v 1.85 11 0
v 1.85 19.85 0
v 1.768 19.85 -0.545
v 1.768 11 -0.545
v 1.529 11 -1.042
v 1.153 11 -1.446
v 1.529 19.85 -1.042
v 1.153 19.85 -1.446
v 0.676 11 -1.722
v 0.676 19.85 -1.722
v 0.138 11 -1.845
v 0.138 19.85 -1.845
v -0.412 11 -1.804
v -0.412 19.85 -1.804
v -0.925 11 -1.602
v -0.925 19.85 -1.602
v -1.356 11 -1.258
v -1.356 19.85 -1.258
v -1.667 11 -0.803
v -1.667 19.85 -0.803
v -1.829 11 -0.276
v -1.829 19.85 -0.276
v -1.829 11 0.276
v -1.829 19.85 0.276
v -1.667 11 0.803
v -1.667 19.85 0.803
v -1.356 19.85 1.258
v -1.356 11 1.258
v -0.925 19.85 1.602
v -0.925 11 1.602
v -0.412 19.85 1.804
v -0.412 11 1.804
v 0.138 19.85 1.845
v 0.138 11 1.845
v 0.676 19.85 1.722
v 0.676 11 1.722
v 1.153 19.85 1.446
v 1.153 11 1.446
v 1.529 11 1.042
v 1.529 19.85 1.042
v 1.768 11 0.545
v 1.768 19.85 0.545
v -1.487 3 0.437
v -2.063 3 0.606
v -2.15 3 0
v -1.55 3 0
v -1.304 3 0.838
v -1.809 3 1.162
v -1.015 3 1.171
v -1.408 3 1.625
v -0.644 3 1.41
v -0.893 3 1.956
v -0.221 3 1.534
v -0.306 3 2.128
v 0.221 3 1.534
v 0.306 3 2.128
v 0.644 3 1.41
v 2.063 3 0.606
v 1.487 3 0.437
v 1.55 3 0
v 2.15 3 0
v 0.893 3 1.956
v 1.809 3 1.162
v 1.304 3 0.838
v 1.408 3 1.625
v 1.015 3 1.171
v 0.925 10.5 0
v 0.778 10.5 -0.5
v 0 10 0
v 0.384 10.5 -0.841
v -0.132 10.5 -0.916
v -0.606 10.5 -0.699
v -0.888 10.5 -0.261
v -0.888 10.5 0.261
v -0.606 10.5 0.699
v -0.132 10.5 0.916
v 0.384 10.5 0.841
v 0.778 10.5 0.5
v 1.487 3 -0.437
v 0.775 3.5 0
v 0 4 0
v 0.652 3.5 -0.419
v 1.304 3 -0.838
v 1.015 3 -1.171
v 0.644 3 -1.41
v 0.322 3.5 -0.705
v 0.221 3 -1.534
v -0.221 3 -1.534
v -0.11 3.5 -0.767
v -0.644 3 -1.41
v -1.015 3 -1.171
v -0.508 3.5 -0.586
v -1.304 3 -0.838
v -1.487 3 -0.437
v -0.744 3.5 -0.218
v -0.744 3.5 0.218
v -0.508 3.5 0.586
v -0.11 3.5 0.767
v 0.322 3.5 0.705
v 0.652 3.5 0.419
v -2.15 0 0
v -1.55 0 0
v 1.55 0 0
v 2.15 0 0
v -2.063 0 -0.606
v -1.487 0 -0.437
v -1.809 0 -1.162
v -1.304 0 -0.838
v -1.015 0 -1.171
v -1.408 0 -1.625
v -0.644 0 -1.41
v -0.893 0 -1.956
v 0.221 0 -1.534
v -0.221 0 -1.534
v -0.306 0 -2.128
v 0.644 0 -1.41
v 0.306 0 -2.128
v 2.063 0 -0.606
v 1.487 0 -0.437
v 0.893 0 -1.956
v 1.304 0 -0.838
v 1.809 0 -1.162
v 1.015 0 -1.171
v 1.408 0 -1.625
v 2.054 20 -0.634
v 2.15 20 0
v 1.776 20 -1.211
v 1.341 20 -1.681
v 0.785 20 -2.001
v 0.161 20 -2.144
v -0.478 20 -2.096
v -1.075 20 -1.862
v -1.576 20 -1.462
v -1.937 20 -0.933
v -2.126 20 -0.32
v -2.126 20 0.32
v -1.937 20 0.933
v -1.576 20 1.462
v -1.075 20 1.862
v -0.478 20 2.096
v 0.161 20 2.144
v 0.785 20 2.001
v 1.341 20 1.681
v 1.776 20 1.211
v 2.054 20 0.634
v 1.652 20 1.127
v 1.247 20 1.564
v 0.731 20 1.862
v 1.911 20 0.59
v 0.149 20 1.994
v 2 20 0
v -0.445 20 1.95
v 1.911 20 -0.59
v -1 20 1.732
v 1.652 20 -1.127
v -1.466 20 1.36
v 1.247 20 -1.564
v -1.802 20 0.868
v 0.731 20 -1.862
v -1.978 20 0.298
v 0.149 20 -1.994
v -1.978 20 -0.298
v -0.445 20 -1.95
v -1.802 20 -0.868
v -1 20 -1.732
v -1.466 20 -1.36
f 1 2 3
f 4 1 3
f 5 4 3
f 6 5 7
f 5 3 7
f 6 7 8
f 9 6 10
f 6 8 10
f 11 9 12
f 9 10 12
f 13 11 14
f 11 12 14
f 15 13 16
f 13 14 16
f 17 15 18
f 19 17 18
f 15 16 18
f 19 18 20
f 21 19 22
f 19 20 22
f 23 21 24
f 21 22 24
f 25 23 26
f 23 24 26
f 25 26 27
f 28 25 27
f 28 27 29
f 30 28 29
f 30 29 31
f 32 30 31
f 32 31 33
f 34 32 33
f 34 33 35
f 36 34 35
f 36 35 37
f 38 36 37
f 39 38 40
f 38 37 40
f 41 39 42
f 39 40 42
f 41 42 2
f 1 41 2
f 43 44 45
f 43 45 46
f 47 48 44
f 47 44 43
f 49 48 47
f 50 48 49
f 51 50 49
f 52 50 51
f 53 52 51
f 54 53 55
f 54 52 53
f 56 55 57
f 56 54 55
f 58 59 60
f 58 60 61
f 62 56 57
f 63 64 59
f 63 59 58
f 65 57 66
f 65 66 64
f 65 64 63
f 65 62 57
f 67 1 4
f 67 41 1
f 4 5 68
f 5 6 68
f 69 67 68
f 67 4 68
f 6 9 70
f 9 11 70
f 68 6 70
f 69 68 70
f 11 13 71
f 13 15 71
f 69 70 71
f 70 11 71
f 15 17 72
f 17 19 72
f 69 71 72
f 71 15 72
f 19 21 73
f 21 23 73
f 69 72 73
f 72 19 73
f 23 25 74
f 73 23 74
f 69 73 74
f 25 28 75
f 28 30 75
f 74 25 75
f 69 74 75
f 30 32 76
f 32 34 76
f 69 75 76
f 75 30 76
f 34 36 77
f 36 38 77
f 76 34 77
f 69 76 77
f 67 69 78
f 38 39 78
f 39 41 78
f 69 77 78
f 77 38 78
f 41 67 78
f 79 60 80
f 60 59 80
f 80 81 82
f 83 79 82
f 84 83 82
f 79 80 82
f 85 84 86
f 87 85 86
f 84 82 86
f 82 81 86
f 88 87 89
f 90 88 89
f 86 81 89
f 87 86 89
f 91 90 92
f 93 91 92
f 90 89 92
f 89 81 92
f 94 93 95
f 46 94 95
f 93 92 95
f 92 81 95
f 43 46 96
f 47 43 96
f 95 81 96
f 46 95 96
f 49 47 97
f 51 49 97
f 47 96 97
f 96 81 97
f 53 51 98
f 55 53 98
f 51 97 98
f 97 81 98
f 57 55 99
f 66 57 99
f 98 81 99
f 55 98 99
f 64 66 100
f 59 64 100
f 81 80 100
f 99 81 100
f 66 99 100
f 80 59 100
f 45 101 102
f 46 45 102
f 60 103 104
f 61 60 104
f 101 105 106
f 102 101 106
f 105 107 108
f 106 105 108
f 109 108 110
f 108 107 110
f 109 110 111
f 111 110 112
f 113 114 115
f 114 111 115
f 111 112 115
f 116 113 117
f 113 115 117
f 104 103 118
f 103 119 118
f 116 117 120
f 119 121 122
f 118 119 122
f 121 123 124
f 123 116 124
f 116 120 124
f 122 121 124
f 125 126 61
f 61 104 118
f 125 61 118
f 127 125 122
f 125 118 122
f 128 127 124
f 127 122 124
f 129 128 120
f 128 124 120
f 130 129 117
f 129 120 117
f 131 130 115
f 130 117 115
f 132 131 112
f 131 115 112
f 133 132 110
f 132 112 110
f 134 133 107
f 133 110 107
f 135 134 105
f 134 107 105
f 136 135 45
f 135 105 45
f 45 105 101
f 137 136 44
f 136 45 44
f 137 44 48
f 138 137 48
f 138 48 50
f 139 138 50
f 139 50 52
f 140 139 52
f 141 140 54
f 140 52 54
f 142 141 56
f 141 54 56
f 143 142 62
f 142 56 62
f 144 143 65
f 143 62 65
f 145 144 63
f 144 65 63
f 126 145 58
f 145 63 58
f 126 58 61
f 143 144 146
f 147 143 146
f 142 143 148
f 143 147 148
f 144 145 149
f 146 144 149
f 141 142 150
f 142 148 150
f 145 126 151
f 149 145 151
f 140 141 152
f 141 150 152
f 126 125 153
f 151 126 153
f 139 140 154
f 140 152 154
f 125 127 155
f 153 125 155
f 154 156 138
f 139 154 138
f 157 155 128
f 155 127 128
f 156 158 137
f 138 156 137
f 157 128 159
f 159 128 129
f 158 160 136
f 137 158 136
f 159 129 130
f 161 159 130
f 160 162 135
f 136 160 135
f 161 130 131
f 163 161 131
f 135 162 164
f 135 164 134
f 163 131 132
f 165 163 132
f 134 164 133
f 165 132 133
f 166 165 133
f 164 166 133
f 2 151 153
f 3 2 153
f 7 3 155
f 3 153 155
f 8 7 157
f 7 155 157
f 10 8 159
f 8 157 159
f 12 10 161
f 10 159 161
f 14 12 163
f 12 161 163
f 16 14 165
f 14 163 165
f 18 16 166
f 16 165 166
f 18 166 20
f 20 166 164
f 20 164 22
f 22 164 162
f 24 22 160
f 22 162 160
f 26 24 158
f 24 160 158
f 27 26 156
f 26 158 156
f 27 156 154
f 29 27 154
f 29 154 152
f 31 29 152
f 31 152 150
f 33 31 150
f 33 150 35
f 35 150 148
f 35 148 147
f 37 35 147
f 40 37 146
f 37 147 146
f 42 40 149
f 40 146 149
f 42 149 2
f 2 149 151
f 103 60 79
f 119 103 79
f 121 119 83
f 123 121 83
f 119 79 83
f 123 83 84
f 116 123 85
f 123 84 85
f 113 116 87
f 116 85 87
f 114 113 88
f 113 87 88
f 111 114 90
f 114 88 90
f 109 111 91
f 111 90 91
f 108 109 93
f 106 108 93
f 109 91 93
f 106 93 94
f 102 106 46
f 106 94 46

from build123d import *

# Parameters (mm, degrees)
ESBO_O3_W             = 4.788650246
ESBO_O3_H             = 2.452019704
CORTE_EXTRUS_O4_DEPTH = 3
CHANFRO1_SIZE         = 0.15


with BuildPart() as part:
    # Esboço1 → Revolução1 (revolve)
    with BuildSketch(Plane.XY):
        Polygon((0, 4), (0, 10), (1.85, 11), (1.85, 20), (2.15, 20), (2.15, 0), (1.55, 0), (1.55, 3), align=None)
    revolve(axis=Axis((0, 4, 0), (0, 1, 0)))

    # Esboço3 → Corte-extrusão4 (cut)
    with BuildSketch(Plane.XZ):
        with Locations((0, 1.226009852)):
            Rectangle(ESBO_O3_W, ESBO_O3_H)
    extrude(amount=-CORTE_EXTRUS_O4_DEPTH, mode=Mode.SUBTRACT)

    # Chanfro1
    chanfro1_edges = [part.edges().sort_by_distance(p)[0] for p in [
        (-1.85, 20, 0),
    ]]
    chamfer(chanfro1_edges, length=CHANFRO1_SIZE)


solid = part.part
